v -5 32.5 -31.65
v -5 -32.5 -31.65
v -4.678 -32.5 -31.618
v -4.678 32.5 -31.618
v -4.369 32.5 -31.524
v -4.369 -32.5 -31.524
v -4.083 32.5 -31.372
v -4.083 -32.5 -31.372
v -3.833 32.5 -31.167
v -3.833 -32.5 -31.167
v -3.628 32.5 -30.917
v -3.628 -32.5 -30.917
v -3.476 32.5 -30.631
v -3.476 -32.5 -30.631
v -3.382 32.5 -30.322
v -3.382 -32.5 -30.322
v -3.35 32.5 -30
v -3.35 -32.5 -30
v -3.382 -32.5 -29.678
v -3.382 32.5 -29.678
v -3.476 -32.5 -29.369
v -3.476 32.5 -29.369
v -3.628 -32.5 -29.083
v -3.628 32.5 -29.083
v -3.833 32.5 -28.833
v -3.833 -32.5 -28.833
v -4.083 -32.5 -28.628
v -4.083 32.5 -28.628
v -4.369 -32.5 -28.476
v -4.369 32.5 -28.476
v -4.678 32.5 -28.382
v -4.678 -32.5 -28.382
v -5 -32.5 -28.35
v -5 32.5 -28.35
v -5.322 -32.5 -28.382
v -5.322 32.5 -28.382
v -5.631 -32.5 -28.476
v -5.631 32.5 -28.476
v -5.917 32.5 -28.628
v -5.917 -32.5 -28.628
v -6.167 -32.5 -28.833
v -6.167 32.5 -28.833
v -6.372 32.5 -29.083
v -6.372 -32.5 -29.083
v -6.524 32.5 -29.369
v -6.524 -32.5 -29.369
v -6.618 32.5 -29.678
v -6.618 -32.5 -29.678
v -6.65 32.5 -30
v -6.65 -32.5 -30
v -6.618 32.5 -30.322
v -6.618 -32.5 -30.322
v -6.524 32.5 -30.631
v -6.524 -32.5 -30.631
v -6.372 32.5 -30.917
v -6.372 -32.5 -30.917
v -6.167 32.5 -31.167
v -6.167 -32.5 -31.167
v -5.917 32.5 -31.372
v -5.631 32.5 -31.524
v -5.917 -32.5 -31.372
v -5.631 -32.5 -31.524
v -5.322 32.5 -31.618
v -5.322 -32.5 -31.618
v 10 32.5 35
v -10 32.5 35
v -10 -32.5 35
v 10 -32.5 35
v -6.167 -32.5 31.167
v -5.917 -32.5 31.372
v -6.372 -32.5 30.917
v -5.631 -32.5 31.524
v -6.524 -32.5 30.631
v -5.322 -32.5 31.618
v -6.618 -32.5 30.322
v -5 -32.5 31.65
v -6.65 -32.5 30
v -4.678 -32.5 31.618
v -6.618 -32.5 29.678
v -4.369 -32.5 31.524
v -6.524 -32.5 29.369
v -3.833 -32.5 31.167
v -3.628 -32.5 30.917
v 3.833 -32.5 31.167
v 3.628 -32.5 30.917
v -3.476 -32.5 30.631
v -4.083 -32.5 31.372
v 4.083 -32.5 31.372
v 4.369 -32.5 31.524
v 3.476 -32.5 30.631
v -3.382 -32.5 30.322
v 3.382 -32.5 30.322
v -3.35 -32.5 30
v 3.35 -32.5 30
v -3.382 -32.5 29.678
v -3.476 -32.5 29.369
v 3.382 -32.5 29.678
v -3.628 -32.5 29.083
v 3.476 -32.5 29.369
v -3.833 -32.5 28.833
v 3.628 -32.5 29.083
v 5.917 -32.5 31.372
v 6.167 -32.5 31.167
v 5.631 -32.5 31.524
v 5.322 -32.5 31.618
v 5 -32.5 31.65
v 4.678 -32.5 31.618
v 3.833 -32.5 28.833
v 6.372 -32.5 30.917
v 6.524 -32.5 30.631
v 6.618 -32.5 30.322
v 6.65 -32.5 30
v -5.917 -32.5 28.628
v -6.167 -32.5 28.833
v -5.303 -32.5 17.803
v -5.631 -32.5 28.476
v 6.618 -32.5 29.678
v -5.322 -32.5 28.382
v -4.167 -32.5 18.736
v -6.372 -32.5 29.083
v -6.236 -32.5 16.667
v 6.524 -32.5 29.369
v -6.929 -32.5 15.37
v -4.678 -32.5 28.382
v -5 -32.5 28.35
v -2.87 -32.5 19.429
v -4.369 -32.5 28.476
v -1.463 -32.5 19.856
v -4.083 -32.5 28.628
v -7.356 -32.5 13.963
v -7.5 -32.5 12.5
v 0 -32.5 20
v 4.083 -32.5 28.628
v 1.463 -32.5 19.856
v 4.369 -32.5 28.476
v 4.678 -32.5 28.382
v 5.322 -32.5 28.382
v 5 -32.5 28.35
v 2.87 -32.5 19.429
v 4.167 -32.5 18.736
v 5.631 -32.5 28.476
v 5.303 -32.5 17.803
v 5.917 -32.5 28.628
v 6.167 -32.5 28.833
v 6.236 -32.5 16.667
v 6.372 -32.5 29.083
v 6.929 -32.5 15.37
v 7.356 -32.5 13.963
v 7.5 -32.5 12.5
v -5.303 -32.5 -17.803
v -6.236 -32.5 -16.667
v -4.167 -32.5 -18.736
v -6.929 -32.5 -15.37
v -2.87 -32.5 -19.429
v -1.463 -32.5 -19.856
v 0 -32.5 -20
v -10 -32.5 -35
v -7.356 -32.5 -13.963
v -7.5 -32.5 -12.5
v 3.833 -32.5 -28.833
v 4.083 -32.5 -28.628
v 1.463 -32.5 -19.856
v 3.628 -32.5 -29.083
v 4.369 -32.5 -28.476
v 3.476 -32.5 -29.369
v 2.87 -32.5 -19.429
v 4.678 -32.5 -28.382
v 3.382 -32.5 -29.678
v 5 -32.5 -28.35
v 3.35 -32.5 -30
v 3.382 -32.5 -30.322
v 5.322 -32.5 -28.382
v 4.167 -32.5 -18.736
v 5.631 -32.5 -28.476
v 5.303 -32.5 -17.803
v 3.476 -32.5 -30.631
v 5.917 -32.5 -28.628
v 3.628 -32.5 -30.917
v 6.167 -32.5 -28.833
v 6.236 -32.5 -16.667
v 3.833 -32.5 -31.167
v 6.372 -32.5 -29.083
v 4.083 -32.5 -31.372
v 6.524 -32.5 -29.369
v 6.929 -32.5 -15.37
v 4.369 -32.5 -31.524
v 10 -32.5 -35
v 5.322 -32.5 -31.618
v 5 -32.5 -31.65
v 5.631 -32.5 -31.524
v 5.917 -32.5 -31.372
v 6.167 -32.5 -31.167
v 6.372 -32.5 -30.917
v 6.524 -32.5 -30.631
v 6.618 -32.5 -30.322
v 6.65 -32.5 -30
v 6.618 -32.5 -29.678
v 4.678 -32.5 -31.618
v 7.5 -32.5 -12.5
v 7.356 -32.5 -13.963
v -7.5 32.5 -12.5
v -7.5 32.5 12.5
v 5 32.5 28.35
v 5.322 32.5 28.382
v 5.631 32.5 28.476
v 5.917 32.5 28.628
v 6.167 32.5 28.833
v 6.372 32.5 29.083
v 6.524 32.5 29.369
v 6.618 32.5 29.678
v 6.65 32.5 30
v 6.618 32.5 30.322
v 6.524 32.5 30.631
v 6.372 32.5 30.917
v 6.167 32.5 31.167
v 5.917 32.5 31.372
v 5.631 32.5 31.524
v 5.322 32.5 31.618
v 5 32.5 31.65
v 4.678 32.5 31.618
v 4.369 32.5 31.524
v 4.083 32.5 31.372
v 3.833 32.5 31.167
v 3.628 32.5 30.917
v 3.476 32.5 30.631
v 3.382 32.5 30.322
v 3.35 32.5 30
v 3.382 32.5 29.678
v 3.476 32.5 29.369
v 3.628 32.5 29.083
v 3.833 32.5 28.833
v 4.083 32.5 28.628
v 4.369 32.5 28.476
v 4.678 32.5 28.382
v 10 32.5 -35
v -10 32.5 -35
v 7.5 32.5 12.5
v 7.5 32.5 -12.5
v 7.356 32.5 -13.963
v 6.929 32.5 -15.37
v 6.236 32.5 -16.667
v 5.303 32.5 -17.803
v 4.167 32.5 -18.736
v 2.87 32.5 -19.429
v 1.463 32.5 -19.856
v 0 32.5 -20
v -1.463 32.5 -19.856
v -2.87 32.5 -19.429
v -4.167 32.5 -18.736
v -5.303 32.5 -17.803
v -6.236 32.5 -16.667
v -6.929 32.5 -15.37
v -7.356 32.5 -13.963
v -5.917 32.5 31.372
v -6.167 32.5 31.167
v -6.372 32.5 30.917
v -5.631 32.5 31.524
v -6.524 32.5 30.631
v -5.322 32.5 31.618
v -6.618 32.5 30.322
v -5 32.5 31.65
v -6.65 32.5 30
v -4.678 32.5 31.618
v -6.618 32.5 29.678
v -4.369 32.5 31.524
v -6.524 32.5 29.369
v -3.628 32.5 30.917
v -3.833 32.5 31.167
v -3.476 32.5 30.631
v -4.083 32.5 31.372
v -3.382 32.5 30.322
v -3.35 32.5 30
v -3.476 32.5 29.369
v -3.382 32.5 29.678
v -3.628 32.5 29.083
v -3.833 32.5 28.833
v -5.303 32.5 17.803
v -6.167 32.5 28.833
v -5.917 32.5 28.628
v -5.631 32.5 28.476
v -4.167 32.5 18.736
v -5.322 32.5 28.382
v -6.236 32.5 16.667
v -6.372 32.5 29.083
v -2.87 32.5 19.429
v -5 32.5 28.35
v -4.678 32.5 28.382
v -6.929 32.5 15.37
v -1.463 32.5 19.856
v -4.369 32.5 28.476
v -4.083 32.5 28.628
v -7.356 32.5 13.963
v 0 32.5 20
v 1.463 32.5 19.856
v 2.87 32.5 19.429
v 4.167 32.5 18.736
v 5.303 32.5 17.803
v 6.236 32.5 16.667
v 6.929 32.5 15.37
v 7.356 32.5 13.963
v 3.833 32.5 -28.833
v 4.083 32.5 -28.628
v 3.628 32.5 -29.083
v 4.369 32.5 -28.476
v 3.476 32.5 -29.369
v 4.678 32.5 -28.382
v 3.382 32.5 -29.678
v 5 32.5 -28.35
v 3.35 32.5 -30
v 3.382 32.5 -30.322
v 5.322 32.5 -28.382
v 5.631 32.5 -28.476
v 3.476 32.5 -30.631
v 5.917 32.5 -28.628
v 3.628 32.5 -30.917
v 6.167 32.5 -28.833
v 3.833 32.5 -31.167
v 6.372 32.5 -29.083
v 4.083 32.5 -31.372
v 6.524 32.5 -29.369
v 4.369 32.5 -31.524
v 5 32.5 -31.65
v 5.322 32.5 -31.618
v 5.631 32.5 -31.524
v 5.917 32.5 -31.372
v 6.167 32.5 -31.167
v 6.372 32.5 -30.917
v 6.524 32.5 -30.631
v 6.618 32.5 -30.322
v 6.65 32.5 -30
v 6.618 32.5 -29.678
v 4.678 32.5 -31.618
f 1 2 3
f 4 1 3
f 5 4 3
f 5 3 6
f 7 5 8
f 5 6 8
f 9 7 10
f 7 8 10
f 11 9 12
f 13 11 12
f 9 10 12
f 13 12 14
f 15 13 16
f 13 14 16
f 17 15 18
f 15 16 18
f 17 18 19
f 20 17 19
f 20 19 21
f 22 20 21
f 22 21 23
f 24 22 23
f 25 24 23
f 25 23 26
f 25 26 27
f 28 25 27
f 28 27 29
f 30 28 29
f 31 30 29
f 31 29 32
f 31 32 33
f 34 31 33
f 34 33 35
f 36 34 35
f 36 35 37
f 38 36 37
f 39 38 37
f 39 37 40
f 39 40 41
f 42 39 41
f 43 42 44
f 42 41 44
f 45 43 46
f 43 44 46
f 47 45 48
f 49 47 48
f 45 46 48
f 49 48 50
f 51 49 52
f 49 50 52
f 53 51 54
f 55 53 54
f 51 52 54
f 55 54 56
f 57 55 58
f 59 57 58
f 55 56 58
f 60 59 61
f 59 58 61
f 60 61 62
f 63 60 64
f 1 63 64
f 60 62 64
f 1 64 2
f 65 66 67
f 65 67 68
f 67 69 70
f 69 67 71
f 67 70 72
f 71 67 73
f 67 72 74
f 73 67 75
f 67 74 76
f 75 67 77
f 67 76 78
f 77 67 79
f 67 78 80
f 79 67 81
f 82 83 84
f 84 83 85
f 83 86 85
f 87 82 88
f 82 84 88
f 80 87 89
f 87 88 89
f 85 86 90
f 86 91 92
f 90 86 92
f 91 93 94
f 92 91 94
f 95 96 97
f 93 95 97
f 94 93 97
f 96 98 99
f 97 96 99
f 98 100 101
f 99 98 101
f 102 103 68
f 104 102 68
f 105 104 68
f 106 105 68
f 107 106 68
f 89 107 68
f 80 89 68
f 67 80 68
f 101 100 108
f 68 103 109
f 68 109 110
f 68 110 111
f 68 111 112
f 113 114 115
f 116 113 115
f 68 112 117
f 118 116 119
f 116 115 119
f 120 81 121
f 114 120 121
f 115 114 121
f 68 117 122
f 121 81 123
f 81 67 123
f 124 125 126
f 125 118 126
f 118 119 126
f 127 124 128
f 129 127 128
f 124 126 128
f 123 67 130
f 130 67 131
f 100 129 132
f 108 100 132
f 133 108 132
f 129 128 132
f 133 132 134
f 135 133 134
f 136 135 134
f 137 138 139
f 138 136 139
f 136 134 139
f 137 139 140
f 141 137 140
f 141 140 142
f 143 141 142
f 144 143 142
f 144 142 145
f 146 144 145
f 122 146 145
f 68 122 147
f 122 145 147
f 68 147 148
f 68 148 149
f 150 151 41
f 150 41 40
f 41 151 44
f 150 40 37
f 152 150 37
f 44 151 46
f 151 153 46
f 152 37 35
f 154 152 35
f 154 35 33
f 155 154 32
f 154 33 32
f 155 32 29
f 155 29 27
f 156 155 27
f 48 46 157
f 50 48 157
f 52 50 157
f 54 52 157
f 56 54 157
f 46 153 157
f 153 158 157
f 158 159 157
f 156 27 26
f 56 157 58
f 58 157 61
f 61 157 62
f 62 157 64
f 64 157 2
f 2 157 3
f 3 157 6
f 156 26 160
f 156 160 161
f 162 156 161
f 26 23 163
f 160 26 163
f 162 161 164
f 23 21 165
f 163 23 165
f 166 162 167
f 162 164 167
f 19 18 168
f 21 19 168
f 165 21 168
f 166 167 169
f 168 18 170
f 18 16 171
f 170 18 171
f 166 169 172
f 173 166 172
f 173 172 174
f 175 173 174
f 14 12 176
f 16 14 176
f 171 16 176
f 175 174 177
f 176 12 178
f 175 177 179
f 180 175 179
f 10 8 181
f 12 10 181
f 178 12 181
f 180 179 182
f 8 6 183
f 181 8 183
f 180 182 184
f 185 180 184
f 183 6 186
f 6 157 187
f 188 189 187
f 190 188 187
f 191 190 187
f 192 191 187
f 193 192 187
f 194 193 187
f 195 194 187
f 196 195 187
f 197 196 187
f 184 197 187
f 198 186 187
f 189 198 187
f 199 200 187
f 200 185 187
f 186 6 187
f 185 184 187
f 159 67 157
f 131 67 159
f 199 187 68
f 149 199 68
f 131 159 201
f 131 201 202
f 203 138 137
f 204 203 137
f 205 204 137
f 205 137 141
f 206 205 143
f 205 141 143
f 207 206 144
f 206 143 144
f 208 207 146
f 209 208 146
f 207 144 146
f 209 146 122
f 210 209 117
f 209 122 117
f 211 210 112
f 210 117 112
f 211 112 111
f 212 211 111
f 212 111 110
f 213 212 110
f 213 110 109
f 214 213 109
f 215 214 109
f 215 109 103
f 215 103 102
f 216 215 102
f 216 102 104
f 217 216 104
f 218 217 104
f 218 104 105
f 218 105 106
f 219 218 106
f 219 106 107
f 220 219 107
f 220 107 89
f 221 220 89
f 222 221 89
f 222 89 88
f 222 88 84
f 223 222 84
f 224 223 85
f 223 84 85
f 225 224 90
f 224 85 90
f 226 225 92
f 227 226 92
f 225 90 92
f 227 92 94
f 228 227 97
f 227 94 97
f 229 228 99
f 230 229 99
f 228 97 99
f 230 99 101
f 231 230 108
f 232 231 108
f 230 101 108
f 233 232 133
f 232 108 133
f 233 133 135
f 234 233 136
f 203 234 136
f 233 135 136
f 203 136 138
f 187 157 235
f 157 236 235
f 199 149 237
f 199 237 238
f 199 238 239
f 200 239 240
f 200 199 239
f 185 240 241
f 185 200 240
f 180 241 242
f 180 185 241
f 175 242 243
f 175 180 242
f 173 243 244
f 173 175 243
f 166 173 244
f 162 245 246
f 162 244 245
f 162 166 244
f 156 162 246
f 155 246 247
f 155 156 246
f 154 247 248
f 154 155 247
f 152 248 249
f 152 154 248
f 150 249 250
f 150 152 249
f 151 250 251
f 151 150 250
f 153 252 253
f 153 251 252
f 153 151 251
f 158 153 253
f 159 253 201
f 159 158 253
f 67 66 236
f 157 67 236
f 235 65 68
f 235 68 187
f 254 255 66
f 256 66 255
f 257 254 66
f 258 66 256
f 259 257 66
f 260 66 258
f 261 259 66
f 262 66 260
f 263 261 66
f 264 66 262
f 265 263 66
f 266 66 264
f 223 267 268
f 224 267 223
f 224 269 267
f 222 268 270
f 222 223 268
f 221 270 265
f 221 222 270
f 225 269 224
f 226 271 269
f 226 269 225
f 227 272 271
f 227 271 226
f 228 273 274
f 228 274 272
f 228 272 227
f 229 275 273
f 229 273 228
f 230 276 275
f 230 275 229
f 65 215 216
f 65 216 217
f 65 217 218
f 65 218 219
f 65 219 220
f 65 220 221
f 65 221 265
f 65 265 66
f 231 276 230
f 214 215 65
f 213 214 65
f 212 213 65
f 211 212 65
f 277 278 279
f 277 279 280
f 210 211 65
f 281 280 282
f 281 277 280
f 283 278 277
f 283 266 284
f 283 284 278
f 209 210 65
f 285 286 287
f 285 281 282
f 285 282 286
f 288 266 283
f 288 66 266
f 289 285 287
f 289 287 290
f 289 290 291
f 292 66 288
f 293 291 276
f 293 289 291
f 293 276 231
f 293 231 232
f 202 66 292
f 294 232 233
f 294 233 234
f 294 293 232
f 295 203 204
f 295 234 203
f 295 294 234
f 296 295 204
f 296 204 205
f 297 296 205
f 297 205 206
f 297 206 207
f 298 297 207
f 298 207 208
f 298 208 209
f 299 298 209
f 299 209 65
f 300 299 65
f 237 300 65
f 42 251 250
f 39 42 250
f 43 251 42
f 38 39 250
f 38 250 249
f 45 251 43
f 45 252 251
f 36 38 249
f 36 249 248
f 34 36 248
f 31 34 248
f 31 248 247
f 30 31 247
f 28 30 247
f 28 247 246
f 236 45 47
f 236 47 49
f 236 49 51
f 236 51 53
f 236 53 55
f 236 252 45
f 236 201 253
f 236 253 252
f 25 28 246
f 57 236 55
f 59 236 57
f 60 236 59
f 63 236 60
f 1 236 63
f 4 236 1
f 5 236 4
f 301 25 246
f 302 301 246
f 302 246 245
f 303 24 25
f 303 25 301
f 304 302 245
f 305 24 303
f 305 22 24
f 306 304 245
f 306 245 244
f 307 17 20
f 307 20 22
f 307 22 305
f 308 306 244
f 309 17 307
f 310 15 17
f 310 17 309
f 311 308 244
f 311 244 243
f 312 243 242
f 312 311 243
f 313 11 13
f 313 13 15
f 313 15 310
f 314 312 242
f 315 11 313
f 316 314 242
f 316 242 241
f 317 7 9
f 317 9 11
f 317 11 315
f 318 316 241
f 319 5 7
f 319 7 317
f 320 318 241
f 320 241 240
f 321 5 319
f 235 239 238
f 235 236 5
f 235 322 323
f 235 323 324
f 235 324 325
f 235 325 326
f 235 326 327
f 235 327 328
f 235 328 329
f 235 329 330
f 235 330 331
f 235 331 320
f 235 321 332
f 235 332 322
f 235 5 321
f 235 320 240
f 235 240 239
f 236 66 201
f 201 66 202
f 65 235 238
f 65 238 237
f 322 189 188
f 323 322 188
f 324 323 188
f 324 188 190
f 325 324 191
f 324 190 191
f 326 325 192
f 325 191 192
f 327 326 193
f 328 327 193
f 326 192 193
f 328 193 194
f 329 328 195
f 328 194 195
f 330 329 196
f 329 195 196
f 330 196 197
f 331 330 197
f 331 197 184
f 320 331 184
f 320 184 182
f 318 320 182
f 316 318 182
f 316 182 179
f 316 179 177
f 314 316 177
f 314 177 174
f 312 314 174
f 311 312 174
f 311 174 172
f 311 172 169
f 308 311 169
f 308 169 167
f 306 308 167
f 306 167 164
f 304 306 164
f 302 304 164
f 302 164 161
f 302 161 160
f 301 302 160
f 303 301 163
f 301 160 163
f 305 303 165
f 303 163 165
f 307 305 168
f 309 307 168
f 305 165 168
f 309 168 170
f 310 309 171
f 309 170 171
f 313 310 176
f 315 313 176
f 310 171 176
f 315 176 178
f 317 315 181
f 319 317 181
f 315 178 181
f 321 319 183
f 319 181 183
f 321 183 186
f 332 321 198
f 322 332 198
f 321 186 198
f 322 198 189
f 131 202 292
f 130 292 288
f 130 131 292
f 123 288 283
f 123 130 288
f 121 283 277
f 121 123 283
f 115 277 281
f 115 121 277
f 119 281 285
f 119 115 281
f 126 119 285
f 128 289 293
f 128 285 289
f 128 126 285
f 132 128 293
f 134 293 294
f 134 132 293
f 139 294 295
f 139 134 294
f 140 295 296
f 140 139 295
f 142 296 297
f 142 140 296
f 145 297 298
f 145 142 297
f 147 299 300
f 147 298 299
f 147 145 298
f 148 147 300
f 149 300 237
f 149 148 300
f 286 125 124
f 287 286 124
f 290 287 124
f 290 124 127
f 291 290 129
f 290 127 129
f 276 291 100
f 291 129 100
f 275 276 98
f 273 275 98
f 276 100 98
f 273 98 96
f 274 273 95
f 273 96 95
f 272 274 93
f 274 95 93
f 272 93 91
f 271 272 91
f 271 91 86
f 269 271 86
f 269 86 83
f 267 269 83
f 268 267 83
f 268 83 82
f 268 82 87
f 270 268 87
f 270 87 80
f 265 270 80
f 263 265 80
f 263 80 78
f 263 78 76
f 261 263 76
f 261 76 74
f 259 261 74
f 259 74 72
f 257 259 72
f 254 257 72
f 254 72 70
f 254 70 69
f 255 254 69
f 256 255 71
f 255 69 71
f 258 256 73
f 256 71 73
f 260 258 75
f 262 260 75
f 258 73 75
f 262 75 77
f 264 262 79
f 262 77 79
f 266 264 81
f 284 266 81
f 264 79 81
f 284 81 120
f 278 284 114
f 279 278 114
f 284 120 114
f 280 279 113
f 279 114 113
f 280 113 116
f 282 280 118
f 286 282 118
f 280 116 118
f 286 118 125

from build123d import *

# Parameters (mm, degrees)
SKETCH1_W             = 20
SKETCH1_H             = 70
BOSS_EXTRUDE1_DEPTH   = 32.5
CUT_EXTRUDE1_DEPTH    = 75.498322129
SKETCH3_R             = 1.5
CUT_EXTRUDE2_DEPTH    = 100
M4_TAPPED_HOLE1_D     = 3.3
M4_TAPPED_HOLE1_DEPTH = 102.1
M4_TAPPED_HOLE1_TIP   = 0.991420021


with BuildPart() as part:
    # Sketch1 → Boss-Extrude1 (new, symmetric)
    with BuildSketch(Plane(origin=(0, 0, 0), x_dir=(1, 0, 0), z_dir=(0, 1, 0))):
        Rectangle(SKETCH1_W, SKETCH1_H)
    extrude(amount=BOSS_EXTRUDE1_DEPTH, both=True)

    # Sketch2 → Cut-Extrude1 (cut, through all)
    with BuildSketch(Plane.XZ.offset(32.5)):
        with BuildLine():
            Line((-7.5, -12.5), (-7.5, 12.5))
            ThreePointArc((-7.5, 12.5), (0, 20), (7.5, 12.5))
            Line((7.5, 12.5), (7.5, -12.5))
            ThreePointArc((7.5, -12.5), (0, -20), (-7.5, -12.5))
        make_face()
    extrude(amount=-CUT_EXTRUDE1_DEPTH, mode=Mode.SUBTRACT)

    # Sketch3 → Cut-Extrude2 (cut)
    with BuildSketch(Plane.XZ.offset(32.5)):
        with Locations(Location((5, 30, 0), (0, 0, 270))):
            Circle(SKETCH3_R)
        with Locations(Location((-5, 30, 0), (0, 0, 90))):
            Circle(SKETCH3_R)
        with Locations(Location((5, -30, 0), (0, 0, 90))):
            Circle(SKETCH3_R)
        with Locations(Location((-5, -30, 0), (0, 0, 270))):
            Circle(SKETCH3_R)
    extrude(amount=-CUT_EXTRUDE2_DEPTH, mode=Mode.SUBTRACT)

    # M4 Tapped Hole1
    with Locations(Plane(origin=(-5, 32.5, 30), x_dir=(0, 0, 1), z_dir=(0, 1, 0))):
        with Locations((0, 0), (0, 10), (-60, 10), (-60, 0)):
            Hole(M4_TAPPED_HOLE1_D / 2, depth=M4_TAPPED_HOLE1_DEPTH)
            with Locations((0, 0, -(M4_TAPPED_HOLE1_DEPTH + M4_TAPPED_HOLE1_TIP / 2))):  # 118° drill point
                Cone(0, M4_TAPPED_HOLE1_D / 2, M4_TAPPED_HOLE1_TIP, mode=Mode.SUBTRACT)


solid = part.part
